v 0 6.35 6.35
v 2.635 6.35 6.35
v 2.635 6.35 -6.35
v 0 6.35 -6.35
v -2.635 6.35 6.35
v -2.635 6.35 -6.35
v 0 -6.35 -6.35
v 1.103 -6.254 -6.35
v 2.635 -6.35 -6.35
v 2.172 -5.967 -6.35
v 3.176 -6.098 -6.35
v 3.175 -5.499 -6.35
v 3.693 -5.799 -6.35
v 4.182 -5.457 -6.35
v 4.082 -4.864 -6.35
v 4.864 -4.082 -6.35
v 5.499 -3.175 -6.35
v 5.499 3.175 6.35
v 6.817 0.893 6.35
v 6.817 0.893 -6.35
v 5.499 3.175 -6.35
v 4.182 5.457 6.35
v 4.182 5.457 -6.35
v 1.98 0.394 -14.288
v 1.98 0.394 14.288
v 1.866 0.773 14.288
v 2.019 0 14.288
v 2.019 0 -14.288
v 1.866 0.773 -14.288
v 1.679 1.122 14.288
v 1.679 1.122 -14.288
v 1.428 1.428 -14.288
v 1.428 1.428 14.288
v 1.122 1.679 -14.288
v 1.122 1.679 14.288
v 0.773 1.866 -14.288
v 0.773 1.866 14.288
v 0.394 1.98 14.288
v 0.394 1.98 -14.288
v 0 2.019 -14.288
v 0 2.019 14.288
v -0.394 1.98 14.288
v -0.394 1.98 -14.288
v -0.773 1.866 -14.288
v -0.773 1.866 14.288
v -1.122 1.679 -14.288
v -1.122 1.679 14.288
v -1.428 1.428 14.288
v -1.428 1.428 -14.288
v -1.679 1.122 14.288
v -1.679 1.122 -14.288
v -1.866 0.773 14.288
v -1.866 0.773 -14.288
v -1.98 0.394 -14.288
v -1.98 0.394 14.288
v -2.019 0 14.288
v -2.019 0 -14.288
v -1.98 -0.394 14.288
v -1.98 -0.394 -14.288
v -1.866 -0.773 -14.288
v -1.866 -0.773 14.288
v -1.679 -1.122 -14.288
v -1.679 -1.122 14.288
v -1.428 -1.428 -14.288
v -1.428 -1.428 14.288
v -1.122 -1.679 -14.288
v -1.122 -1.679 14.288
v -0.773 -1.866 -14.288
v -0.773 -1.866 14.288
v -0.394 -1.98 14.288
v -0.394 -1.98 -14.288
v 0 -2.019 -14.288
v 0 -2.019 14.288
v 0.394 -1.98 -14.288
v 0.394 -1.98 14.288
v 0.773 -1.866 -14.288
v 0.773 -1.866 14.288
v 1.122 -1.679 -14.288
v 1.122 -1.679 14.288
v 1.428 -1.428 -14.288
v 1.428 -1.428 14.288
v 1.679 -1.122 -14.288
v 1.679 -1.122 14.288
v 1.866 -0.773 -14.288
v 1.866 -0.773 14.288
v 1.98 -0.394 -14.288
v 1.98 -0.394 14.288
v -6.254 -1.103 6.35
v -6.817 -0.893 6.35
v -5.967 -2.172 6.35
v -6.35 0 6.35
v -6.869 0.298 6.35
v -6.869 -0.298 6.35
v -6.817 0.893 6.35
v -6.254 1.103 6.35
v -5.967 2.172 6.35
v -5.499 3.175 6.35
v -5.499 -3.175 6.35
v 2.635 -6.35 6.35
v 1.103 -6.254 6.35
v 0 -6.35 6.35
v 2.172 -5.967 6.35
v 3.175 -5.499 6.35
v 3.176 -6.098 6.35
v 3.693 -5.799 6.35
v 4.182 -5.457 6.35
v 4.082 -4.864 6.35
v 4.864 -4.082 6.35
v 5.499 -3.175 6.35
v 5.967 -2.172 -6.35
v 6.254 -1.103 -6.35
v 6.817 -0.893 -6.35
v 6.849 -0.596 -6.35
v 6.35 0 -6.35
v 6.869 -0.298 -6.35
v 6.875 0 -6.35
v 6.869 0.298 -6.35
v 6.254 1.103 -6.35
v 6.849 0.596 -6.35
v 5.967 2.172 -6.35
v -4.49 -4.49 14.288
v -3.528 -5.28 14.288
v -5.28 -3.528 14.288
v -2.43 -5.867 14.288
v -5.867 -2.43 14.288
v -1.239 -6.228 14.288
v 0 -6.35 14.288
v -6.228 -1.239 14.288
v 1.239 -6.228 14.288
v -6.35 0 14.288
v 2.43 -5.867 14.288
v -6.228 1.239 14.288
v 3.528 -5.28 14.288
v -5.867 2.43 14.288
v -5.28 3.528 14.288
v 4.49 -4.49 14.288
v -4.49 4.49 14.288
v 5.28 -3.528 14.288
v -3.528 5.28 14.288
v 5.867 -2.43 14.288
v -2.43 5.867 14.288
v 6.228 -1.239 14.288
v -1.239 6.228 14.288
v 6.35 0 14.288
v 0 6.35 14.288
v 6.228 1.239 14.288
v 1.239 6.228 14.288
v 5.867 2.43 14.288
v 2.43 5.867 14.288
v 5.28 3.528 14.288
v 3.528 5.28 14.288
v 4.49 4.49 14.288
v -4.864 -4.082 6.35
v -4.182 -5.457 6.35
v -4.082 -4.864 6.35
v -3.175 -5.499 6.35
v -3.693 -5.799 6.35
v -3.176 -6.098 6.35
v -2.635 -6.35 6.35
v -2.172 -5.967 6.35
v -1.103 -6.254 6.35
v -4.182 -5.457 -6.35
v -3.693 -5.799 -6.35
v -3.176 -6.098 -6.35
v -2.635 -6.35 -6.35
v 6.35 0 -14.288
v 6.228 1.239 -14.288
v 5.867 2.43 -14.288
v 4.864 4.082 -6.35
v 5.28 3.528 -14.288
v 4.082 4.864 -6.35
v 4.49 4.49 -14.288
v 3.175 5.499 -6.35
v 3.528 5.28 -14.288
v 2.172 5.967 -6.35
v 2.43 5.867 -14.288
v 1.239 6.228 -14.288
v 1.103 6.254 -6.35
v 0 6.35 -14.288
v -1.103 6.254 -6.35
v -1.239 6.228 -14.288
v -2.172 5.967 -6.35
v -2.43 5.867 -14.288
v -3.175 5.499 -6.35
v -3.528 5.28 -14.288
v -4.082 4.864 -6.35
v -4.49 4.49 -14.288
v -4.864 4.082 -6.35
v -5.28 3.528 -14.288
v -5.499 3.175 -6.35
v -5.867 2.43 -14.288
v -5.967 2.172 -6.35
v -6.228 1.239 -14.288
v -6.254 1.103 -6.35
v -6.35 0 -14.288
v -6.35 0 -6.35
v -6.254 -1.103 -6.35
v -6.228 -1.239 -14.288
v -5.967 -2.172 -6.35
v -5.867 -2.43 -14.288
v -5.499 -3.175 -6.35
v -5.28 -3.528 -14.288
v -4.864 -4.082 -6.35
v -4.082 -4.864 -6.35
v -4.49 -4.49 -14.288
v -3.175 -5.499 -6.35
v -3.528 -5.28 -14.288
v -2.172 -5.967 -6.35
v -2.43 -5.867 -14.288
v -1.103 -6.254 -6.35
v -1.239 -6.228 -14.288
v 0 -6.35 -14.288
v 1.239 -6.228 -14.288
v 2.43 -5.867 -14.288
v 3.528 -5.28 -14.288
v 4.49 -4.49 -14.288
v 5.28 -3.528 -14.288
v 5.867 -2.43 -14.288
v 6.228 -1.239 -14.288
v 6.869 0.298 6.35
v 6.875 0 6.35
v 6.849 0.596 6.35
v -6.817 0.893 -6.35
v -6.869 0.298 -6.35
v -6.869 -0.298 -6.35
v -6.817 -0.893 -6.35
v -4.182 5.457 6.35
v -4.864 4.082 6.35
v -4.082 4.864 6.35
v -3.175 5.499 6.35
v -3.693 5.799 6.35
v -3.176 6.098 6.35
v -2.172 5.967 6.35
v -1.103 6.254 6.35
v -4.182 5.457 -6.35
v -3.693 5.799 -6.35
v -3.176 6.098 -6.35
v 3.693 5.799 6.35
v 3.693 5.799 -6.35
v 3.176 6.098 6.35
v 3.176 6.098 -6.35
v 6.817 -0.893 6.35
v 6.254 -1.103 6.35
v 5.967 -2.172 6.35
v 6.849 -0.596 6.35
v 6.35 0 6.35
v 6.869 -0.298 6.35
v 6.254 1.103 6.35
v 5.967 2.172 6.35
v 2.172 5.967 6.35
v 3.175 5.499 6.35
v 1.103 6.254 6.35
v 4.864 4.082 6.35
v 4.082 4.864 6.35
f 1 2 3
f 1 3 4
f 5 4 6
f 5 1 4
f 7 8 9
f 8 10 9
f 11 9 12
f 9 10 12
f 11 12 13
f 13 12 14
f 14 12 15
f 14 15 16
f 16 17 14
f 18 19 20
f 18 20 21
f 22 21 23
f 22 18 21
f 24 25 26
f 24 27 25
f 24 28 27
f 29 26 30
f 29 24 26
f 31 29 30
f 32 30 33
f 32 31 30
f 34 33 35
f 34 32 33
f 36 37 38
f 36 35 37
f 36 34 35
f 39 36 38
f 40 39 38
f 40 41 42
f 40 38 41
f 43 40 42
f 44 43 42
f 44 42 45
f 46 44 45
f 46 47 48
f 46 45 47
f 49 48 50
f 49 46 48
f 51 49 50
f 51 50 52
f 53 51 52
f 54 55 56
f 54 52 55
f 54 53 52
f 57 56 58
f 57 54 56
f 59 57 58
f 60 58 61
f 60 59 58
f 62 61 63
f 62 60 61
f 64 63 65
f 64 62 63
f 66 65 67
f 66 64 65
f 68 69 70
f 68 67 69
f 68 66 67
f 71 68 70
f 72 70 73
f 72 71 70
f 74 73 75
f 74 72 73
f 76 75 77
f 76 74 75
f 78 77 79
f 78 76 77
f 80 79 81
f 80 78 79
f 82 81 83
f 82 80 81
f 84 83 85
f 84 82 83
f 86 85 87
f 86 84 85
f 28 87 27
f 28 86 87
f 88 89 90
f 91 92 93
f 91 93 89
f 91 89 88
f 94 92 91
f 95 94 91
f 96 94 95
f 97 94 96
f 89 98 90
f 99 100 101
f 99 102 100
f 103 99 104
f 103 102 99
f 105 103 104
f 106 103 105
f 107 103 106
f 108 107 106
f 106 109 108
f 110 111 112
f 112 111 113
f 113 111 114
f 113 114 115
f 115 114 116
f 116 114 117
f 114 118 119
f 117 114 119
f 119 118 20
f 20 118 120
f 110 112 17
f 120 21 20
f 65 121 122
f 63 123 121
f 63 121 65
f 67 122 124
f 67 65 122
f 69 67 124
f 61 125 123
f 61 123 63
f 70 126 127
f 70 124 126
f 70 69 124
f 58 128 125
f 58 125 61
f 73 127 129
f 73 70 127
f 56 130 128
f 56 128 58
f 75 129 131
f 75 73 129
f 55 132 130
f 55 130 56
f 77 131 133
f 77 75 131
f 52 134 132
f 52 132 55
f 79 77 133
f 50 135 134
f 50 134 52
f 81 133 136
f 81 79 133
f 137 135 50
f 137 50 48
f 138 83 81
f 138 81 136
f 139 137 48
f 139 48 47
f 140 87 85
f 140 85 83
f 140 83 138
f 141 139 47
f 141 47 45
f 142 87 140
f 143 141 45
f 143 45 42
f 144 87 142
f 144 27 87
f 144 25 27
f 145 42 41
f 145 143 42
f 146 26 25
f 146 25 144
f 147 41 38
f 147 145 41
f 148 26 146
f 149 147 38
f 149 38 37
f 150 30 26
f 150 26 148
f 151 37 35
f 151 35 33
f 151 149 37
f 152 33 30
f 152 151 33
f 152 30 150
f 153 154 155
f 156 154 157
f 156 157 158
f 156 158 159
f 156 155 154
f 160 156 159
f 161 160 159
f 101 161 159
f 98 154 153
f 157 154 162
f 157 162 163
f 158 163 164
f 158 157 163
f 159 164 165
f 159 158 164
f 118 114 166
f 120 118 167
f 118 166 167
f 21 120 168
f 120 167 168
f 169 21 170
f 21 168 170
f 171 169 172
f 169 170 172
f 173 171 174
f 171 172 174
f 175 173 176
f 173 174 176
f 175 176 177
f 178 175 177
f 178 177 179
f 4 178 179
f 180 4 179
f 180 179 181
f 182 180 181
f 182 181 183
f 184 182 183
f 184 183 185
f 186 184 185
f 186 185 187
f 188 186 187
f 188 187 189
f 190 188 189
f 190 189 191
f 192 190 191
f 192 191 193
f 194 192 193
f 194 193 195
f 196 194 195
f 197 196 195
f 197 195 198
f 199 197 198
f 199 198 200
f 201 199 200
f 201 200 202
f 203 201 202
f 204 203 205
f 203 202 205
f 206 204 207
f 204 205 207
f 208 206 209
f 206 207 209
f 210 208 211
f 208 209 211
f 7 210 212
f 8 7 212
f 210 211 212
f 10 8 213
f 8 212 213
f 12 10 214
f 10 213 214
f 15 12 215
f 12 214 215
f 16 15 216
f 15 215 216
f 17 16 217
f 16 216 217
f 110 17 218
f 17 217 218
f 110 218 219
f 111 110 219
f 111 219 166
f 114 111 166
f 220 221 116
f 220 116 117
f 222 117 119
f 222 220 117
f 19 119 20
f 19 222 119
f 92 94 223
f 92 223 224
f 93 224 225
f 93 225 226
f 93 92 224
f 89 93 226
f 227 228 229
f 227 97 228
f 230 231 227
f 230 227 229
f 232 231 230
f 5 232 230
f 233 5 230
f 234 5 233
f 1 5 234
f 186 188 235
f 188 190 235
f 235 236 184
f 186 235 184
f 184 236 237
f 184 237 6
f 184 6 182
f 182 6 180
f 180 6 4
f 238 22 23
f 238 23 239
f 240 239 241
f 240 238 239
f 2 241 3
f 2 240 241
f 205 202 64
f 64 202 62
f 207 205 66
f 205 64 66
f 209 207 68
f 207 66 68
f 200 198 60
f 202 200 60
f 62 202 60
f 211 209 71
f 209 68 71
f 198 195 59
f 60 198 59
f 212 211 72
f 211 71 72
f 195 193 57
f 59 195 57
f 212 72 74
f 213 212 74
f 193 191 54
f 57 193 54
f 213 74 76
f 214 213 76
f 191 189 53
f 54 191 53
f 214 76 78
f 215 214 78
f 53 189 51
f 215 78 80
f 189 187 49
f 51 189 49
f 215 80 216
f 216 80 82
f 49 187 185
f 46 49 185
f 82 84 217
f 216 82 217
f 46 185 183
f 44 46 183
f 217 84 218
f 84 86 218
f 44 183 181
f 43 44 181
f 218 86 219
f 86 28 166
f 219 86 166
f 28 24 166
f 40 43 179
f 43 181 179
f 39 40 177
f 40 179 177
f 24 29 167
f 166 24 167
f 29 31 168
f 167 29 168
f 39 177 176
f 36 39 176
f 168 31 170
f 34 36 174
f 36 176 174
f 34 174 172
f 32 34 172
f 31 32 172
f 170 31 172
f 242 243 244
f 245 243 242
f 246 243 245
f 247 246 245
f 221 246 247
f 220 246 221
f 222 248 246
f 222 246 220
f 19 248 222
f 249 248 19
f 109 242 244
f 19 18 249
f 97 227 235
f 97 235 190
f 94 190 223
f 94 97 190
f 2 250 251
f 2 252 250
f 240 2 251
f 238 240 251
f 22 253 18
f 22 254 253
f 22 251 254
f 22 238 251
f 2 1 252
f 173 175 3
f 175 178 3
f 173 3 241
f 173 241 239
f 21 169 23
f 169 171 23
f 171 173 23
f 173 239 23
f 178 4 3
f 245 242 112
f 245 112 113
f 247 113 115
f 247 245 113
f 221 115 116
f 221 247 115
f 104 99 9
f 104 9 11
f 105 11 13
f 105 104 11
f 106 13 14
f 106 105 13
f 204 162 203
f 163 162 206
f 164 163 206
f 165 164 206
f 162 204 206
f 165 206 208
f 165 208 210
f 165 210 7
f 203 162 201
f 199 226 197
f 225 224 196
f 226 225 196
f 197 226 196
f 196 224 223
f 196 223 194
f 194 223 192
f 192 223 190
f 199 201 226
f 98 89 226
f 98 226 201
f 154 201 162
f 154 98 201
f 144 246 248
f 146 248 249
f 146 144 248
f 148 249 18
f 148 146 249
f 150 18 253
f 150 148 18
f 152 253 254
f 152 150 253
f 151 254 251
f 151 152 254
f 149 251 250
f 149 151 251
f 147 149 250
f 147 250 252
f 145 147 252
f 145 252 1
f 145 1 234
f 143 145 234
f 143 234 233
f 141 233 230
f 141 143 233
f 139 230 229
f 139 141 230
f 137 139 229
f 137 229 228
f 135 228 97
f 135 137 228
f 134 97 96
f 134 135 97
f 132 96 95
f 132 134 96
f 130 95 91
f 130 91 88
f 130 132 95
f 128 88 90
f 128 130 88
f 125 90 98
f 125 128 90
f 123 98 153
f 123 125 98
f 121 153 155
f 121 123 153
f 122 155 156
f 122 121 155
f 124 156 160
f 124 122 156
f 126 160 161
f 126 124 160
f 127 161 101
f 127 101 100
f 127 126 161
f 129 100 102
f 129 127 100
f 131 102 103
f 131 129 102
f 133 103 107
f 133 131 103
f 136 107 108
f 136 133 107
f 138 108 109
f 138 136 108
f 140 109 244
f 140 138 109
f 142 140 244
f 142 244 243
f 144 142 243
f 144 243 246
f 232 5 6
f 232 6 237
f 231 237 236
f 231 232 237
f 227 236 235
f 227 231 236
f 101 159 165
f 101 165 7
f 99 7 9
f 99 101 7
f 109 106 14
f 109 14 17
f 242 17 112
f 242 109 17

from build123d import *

# Parameters (mm, degrees)
SKETCH1_R                            = 2.0193
BOSS_EXTRUDE1_DEPTH                  = 14.2875
F_10_32_TAPPED_HOLE1_D               = 4.0386
F_10_32_TAPPED_HOLE1_DEPTH           = 11.938
F_10_32_TAPPED_HOLE1_TIP             = 1.213317848
F_10_32_TAPPED_HOLE1_ON_FACE_2_D     = 4.0386
F_10_32_TAPPED_HOLE1_ON_FACE_2_DEPTH = 11.938
F_10_32_TAPPED_HOLE1_ON_FACE_2_TIP   = 1.213317848
SKETCH4_R                            = 8.89
SKETCH4_R_2                          = 6.35
CUT_EXTRUDE_THIN1_DEPTH              = 7.9375


with BuildPart() as part:
    # Sketch1 → Boss-Extrude1 (new, symmetric)
    with BuildSketch(Plane.XY):
        with BuildLine():
            ThreePointArc((6.874999966, 0), (6.860422465, 0.447468582), (6.816751782, 0.893039571))
            Line((6.816751782, 0.893039571), (4.181770846, 5.456960429))
            ThreePointArc((4.181770846, 5.456960429), (3.437499983, 5.953924622), (2.634980936, 6.35))
            Line((2.634980936, 6.35), (-2.634980936, 6.35))
            ThreePointArc((-2.634980936, 6.35), (-3.437499983, 5.953924622), (-4.181770846, 5.456960429))
            Line((-4.181770846, 5.456960429), (-6.816751782, 0.893039571))
            ThreePointArc((-6.816751782, 0.893039571), (-6.874999966, 0), (-6.816751782, -0.893039571))
            Line((-6.816751782, -0.893039571), (-4.181770846, -5.456960429))
            ThreePointArc((-4.181770846, -5.456960429), (-3.437499983, -5.953924622), (-2.634980936, -6.35))
            Line((-2.634980936, -6.35), (2.634980936, -6.35))
            ThreePointArc((2.634980936, -6.35), (3.437499983, -5.953924622), (4.181770846, -5.456960429))
            Line((4.181770846, -5.456960429), (6.816751782, -0.893039571))
            ThreePointArc((6.816751782, -0.893039571), (6.860422465, -0.447468582), (6.874999966, 0))
        make_face()
        Circle(SKETCH1_R, mode=Mode.SUBTRACT)
    extrude(amount=BOSS_EXTRUDE1_DEPTH, both=True)

    # #10-32 Tapped Hole1
    with Locations(Plane.XY.offset(14.2875)):
        with Locations((0, 0)):
            Hole(F_10_32_TAPPED_HOLE1_D / 2, depth=F_10_32_TAPPED_HOLE1_DEPTH)
            with Locations((0, 0, -(F_10_32_TAPPED_HOLE1_DEPTH + F_10_32_TAPPED_HOLE1_TIP / 2))):  # 118° drill point
                Cone(0, F_10_32_TAPPED_HOLE1_D / 2, F_10_32_TAPPED_HOLE1_TIP, mode=Mode.SUBTRACT)

    # #10-32 Tapped Hole1 on face 2
    with Locations(Plane.XY.offset(-14.2875)):
        with Locations((0, 0)):
            Hole(F_10_32_TAPPED_HOLE1_ON_FACE_2_D / 2, depth=F_10_32_TAPPED_HOLE1_ON_FACE_2_DEPTH)
            with Locations((0, 0, -(F_10_32_TAPPED_HOLE1_ON_FACE_2_DEPTH + F_10_32_TAPPED_HOLE1_ON_FACE_2_TIP / 2))):  # 118° drill point
                Cone(0, F_10_32_TAPPED_HOLE1_ON_FACE_2_D / 2, F_10_32_TAPPED_HOLE1_ON_FACE_2_TIP, mode=Mode.SUBTRACT)

    # Sketch4 → Cut-Extrude-Thin1 (cut)
    with BuildSketch(Plane.XY.offset(14.2875)):
        Circle(SKETCH4_R)
        Circle(SKETCH4_R_2, mode=Mode.SUBTRACT)
    cut_extrude_thin1 = extrude(amount=-CUT_EXTRUDE_THIN1_DEPTH, mode=Mode.SUBTRACT)

    # Mirror1: Cut-Extrude-Thin1 across plane
    add(cut_extrude_thin1.mirror(Plane.XY), mode=Mode.SUBTRACT)


solid = part.part
